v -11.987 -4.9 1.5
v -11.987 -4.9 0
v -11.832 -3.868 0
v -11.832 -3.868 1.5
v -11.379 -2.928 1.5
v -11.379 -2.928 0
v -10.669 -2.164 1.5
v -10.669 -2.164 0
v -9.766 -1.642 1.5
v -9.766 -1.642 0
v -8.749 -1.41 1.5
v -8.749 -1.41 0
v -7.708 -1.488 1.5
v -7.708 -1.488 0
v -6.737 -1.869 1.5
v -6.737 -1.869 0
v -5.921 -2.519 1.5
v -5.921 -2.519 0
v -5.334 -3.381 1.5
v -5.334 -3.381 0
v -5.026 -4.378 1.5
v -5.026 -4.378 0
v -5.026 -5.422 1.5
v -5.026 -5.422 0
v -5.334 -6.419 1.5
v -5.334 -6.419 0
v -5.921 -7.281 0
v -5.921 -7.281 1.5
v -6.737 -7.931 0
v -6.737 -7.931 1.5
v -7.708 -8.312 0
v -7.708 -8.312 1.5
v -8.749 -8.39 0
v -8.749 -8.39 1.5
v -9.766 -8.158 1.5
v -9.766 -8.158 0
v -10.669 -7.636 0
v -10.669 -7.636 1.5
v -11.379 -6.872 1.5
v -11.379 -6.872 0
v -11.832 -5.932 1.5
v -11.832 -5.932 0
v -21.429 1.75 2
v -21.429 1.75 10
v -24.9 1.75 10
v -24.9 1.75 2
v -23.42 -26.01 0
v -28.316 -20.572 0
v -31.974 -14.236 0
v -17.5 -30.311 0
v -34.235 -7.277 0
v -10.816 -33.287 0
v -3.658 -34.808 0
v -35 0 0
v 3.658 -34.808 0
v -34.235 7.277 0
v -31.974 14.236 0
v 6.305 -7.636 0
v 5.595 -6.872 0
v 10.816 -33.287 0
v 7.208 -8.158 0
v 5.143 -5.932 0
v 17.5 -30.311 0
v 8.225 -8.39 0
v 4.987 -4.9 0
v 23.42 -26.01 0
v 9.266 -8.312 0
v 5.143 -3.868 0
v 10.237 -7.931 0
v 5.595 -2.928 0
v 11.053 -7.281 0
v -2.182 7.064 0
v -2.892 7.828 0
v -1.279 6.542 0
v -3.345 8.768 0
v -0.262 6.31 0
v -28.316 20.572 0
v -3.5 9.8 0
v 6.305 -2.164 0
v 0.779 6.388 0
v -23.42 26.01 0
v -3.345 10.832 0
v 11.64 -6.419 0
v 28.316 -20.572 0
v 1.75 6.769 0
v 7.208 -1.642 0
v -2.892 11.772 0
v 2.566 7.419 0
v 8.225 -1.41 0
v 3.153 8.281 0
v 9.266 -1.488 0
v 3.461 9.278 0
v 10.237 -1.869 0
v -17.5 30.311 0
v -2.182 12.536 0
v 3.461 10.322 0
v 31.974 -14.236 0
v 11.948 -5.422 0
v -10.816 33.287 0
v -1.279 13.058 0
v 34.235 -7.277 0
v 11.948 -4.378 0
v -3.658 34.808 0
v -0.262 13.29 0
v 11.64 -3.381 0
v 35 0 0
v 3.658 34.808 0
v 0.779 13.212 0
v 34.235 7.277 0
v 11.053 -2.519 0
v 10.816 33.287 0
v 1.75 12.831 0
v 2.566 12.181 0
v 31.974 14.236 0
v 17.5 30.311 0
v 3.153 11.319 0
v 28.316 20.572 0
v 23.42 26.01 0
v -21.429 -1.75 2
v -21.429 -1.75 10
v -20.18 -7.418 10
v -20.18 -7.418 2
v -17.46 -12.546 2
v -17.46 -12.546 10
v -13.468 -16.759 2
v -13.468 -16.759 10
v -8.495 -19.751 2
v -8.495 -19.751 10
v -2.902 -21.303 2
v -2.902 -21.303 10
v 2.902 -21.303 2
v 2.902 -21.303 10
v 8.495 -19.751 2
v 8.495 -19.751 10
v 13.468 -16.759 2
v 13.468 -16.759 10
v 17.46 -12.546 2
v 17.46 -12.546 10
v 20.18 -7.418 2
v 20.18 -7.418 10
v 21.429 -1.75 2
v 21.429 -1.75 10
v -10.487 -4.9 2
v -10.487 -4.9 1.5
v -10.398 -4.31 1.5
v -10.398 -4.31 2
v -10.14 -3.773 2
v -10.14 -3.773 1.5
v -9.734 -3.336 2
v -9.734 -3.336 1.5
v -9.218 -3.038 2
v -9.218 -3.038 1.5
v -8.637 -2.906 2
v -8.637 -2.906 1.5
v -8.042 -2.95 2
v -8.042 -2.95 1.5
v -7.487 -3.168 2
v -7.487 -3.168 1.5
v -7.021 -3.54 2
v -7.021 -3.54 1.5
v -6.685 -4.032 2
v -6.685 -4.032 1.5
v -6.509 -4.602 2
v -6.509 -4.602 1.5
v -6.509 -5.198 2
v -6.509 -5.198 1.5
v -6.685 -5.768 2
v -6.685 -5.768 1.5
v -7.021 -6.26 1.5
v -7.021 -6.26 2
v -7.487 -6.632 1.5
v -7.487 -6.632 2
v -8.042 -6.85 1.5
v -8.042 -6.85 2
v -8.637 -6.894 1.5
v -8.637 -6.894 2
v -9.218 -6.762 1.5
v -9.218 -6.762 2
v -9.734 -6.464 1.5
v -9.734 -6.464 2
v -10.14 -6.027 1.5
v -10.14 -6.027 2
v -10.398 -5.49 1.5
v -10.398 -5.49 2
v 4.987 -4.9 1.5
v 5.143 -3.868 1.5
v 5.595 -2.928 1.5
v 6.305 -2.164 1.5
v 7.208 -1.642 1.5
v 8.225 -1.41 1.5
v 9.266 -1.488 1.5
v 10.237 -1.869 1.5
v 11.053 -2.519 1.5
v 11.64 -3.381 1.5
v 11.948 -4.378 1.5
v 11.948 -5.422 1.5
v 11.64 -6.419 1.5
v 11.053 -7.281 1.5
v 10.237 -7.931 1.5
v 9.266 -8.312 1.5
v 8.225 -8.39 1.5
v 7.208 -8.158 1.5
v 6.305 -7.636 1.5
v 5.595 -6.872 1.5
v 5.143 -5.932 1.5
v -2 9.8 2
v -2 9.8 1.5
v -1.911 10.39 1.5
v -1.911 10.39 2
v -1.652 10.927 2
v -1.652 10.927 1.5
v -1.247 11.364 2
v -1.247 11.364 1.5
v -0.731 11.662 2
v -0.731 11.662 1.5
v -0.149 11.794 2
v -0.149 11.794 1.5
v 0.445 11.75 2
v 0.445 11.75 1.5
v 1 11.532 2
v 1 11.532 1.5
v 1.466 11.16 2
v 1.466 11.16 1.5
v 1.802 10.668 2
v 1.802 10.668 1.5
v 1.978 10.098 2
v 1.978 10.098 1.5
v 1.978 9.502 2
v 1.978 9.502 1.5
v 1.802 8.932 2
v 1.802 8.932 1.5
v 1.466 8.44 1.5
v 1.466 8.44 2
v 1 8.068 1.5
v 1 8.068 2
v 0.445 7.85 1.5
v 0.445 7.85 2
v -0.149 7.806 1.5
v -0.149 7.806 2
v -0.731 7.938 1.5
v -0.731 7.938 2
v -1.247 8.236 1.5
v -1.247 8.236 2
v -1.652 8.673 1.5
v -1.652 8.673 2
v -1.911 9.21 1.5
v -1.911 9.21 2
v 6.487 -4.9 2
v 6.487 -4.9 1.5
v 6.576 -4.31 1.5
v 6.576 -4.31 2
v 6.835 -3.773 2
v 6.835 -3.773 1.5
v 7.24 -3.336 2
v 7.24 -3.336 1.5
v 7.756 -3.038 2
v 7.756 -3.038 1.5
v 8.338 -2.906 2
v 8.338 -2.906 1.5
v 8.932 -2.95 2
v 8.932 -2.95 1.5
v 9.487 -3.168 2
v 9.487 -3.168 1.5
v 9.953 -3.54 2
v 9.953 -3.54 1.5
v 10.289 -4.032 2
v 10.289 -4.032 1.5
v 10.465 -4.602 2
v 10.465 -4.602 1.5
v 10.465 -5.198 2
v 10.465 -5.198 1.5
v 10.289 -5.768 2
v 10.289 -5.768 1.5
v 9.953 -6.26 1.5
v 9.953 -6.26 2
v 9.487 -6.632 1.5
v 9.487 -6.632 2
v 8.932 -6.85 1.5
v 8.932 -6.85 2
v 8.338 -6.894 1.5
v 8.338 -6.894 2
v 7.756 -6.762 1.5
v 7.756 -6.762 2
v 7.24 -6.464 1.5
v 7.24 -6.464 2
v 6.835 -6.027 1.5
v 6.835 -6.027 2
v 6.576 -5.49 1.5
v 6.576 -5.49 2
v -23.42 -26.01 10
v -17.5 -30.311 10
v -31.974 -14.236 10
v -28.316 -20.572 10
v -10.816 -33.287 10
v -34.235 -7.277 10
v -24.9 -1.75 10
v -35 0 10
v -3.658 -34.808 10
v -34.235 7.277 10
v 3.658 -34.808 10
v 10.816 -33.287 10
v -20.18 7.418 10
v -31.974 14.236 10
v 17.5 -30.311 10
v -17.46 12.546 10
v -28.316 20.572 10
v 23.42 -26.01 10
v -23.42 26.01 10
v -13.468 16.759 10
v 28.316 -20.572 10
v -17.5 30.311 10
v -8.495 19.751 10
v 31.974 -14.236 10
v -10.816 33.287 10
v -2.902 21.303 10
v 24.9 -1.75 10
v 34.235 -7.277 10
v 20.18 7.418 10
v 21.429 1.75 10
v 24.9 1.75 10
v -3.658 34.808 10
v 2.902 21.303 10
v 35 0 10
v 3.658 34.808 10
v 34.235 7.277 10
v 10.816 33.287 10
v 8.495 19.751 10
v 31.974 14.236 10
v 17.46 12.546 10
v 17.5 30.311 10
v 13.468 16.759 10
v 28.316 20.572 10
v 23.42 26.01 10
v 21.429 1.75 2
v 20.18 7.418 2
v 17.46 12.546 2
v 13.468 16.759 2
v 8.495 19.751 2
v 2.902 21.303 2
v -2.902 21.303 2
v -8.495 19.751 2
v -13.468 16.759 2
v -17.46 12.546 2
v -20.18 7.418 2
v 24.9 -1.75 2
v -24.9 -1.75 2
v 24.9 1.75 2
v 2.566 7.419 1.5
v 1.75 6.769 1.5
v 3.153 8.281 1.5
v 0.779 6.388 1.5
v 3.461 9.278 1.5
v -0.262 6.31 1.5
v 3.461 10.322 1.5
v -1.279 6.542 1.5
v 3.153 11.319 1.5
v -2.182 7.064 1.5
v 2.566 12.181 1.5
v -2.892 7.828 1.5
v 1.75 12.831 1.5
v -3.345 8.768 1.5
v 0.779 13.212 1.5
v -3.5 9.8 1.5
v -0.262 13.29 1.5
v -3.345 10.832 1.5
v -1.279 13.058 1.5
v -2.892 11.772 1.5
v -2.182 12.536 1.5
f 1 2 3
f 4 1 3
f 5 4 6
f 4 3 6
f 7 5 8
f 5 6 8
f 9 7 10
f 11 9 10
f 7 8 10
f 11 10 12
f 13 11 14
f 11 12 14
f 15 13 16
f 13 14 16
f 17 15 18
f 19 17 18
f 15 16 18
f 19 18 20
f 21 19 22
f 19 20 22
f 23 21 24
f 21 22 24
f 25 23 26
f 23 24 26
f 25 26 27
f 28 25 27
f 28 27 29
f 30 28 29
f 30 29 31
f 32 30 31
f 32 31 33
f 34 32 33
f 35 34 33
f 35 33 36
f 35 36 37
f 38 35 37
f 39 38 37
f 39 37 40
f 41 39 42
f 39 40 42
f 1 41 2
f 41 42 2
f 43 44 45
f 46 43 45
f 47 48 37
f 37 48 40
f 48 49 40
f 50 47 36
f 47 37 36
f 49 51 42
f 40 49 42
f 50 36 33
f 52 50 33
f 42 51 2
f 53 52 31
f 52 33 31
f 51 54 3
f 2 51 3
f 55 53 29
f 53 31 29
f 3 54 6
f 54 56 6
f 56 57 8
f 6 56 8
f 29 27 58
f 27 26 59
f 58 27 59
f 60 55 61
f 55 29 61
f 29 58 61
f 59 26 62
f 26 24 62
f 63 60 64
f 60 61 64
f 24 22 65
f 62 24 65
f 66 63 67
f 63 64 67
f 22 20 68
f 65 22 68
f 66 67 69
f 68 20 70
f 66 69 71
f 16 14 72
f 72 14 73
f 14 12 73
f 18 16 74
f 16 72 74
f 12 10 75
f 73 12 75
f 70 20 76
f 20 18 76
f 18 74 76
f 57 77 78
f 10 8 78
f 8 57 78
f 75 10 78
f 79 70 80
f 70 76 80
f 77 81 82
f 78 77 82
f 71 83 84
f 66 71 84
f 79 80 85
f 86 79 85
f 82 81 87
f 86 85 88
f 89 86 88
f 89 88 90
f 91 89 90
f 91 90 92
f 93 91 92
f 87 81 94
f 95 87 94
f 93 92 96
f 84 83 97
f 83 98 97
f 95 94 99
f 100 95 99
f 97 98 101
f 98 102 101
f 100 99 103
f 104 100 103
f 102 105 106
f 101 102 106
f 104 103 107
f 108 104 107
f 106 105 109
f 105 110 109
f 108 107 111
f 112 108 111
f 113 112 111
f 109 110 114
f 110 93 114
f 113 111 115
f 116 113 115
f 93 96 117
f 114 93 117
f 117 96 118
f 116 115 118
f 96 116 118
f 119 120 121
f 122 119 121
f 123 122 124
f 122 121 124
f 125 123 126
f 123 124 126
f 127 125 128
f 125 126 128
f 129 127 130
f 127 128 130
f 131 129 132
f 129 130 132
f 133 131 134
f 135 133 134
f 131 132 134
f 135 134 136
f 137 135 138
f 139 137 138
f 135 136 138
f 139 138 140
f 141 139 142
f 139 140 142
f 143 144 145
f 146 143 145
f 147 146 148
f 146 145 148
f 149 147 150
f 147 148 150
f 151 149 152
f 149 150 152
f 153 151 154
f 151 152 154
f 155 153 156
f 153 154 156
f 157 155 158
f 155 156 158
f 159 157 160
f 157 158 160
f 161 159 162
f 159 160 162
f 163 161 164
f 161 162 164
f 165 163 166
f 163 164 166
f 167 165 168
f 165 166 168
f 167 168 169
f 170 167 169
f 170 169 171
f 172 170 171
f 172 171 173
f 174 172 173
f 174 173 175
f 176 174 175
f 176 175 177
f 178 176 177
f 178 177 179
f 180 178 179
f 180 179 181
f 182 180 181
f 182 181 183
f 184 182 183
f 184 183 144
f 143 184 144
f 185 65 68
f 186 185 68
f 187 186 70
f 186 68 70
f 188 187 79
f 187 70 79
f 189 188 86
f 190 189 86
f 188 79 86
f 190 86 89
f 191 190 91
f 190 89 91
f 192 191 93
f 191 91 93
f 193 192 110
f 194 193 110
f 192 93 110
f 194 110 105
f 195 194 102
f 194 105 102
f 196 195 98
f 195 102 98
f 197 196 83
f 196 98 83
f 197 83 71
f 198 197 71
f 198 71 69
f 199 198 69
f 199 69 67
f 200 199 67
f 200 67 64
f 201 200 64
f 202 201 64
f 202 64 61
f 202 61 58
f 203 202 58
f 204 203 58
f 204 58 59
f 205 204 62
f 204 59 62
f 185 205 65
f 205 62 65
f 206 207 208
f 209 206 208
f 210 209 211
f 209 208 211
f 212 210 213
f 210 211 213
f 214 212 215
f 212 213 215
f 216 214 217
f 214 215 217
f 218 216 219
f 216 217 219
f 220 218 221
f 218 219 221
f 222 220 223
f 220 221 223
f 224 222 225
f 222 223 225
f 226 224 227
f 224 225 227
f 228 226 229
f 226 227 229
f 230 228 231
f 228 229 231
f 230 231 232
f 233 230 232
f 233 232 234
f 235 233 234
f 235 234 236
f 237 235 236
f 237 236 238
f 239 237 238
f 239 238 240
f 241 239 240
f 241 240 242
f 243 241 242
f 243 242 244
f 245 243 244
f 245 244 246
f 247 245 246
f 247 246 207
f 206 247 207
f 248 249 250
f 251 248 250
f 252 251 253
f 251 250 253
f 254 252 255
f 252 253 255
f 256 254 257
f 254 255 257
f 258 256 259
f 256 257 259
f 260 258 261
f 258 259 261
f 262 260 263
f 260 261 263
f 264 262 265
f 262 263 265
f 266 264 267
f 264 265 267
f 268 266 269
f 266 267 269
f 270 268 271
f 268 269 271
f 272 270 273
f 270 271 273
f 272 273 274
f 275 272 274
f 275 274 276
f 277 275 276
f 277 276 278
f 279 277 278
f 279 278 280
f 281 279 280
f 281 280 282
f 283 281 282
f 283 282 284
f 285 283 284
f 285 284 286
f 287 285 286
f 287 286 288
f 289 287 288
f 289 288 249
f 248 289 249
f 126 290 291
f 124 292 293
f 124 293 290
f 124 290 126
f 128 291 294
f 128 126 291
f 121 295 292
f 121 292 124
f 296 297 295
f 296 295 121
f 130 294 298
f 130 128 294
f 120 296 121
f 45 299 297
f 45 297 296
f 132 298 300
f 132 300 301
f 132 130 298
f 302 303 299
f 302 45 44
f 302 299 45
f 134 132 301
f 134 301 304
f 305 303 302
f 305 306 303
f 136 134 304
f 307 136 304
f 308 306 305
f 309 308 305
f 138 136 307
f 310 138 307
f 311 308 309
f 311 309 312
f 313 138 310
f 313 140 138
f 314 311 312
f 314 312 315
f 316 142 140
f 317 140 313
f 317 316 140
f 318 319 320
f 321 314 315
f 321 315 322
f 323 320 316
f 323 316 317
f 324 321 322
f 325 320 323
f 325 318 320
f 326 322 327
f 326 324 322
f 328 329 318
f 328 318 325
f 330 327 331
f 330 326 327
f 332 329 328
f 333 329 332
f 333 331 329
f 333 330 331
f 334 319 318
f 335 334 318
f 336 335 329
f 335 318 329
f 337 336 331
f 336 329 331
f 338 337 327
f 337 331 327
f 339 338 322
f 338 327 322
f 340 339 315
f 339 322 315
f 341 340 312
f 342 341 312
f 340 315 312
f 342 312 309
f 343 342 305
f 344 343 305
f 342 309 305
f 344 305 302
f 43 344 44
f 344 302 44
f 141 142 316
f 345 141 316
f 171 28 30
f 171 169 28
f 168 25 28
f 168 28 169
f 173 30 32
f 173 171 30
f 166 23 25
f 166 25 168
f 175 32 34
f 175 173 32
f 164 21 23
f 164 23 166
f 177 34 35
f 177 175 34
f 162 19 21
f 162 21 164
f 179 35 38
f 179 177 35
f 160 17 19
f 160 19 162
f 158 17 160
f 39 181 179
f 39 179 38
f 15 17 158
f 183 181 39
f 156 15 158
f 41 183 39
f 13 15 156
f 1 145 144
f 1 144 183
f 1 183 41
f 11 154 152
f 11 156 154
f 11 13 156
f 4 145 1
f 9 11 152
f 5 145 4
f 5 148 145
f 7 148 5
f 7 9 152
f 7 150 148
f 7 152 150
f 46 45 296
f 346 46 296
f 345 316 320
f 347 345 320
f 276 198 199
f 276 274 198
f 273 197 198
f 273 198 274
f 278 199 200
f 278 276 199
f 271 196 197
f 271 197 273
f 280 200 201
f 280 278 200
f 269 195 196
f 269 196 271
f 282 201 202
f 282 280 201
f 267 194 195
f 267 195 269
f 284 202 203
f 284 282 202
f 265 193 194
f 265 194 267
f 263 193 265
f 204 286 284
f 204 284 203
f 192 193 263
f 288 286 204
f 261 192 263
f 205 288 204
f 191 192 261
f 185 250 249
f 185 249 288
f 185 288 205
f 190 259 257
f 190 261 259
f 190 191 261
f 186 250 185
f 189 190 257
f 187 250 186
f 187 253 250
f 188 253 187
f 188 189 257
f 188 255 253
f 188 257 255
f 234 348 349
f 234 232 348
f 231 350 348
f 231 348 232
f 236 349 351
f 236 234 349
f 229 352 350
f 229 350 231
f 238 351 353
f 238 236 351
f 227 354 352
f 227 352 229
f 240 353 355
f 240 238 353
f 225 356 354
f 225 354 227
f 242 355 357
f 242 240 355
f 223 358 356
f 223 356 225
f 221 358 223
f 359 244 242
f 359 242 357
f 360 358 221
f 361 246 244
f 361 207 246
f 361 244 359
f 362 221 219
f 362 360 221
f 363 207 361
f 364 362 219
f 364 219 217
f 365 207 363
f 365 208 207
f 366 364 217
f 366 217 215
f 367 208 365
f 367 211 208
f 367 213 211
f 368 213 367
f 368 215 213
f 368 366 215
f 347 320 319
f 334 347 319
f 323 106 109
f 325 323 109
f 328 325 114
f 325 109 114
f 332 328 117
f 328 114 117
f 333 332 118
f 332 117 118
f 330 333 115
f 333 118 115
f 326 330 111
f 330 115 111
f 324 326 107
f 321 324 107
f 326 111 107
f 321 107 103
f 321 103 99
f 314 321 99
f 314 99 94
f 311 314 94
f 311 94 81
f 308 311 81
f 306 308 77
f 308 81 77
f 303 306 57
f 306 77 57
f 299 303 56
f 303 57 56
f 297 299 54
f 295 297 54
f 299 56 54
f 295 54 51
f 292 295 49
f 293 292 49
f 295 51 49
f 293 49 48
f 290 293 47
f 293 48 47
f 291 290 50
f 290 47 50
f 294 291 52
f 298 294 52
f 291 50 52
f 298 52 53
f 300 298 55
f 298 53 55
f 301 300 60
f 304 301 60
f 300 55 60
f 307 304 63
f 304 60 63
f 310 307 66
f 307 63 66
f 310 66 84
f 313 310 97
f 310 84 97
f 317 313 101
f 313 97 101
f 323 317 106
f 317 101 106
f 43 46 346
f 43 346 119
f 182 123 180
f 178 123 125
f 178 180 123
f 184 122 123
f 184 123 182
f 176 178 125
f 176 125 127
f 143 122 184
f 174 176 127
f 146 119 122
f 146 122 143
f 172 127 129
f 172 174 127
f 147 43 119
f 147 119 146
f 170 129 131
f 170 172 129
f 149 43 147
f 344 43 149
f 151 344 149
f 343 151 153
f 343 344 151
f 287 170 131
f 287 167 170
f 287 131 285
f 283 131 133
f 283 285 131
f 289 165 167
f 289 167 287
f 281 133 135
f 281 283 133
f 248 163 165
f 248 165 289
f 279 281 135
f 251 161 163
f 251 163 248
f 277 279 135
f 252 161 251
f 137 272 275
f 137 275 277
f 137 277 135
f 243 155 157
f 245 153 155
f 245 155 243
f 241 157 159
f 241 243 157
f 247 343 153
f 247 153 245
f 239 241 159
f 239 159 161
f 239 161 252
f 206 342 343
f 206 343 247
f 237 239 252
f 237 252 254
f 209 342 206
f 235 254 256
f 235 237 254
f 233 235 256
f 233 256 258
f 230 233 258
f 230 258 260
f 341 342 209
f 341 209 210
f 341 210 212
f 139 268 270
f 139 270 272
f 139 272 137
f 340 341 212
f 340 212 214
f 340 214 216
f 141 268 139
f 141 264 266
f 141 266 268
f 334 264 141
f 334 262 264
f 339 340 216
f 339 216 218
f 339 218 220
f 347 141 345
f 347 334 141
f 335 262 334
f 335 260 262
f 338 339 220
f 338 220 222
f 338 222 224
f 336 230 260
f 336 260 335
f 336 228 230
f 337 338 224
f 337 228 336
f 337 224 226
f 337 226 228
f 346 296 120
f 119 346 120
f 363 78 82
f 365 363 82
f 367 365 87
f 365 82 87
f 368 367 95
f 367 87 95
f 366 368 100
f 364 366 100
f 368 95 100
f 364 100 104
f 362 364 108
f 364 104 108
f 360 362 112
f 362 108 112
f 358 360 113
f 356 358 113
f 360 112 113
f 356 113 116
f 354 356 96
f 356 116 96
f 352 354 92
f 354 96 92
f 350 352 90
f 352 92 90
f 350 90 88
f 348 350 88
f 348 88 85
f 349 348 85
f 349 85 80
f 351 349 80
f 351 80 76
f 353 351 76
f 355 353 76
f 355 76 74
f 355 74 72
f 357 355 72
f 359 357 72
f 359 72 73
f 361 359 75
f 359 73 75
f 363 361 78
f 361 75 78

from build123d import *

# Parameters (mm, degrees)
SKETCH_1_R          = 35
EXTRUDE_1_DEPTH     = 10
CUT_EXTRUDE_1_DEPTH = 8
SKETCH_4_R          = 3.5
CUT_EXTRUDE_2_DEPTH = 1.5
SKETCH_6_R          = 2
CUT_EXTRUDE_3_DEPTH = 51.222007128


with BuildPart() as part:
    # 草图1 → 凸台-拉伸1 (new body)
    with BuildSketch(Plane.XY):
        Circle(SKETCH_1_R)
    extrude(amount=EXTRUDE_1_DEPTH)

    # 草图2 → 切除-拉伸1 (cut)
    with BuildSketch(Plane.XY.offset(10)):
        with BuildLine():
            ThreePointArc((21.428660714, 1.75), (0, 21.5), (-21.428660714, 1.75))
            Line((-21.428660714, 1.75), (-24.9, 1.75))
            Line((-24.9, 1.75), (-24.9, -1.75))
            Line((-24.9, -1.75), (-21.428660714, -1.75))
            ThreePointArc((-21.428660714, -1.75), (0, -21.5), (21.428660714, -1.75))
            Line((21.428660714, -1.75), (24.9, -1.75))
            Line((24.9, -1.75), (24.9, 1.75))
            Line((24.9, 1.75), (21.428660714, 1.75))
        make_face()
    extrude(amount=-CUT_EXTRUDE_1_DEPTH, mode=Mode.SUBTRACT)

    # 草图4 → 切除-拉伸2 (cut)
    with BuildSketch(Plane(origin=(0, 0, 0), x_dir=(-1, 0, 0), z_dir=(0, 0, -1))):
        with Locations((8.487048957, -4.9)):
            Circle(SKETCH_4_R)
        with Locations((-8.487048957, -4.9)):
            Circle(SKETCH_4_R)
        with Locations((0, 9.8)):
            Circle(SKETCH_4_R)
    extrude(amount=-CUT_EXTRUDE_2_DEPTH, mode=Mode.SUBTRACT)

    # 草图6 → 切除-拉伸3 (cut, through all)
    with BuildSketch(Plane(origin=(0, 0, 1.5), x_dir=(-1, 0, 0), z_dir=(0, 0, -1))):
        with Locations((0, 9.8)):
            Circle(SKETCH_6_R)
        with Locations((8.487048957, -4.9)):
            Circle(SKETCH_6_R)
        with Locations((-8.487048957, -4.9)):
            Circle(SKETCH_6_R)
    extrude(amount=-CUT_EXTRUDE_3_DEPTH, mode=Mode.SUBTRACT)


solid = part.part
